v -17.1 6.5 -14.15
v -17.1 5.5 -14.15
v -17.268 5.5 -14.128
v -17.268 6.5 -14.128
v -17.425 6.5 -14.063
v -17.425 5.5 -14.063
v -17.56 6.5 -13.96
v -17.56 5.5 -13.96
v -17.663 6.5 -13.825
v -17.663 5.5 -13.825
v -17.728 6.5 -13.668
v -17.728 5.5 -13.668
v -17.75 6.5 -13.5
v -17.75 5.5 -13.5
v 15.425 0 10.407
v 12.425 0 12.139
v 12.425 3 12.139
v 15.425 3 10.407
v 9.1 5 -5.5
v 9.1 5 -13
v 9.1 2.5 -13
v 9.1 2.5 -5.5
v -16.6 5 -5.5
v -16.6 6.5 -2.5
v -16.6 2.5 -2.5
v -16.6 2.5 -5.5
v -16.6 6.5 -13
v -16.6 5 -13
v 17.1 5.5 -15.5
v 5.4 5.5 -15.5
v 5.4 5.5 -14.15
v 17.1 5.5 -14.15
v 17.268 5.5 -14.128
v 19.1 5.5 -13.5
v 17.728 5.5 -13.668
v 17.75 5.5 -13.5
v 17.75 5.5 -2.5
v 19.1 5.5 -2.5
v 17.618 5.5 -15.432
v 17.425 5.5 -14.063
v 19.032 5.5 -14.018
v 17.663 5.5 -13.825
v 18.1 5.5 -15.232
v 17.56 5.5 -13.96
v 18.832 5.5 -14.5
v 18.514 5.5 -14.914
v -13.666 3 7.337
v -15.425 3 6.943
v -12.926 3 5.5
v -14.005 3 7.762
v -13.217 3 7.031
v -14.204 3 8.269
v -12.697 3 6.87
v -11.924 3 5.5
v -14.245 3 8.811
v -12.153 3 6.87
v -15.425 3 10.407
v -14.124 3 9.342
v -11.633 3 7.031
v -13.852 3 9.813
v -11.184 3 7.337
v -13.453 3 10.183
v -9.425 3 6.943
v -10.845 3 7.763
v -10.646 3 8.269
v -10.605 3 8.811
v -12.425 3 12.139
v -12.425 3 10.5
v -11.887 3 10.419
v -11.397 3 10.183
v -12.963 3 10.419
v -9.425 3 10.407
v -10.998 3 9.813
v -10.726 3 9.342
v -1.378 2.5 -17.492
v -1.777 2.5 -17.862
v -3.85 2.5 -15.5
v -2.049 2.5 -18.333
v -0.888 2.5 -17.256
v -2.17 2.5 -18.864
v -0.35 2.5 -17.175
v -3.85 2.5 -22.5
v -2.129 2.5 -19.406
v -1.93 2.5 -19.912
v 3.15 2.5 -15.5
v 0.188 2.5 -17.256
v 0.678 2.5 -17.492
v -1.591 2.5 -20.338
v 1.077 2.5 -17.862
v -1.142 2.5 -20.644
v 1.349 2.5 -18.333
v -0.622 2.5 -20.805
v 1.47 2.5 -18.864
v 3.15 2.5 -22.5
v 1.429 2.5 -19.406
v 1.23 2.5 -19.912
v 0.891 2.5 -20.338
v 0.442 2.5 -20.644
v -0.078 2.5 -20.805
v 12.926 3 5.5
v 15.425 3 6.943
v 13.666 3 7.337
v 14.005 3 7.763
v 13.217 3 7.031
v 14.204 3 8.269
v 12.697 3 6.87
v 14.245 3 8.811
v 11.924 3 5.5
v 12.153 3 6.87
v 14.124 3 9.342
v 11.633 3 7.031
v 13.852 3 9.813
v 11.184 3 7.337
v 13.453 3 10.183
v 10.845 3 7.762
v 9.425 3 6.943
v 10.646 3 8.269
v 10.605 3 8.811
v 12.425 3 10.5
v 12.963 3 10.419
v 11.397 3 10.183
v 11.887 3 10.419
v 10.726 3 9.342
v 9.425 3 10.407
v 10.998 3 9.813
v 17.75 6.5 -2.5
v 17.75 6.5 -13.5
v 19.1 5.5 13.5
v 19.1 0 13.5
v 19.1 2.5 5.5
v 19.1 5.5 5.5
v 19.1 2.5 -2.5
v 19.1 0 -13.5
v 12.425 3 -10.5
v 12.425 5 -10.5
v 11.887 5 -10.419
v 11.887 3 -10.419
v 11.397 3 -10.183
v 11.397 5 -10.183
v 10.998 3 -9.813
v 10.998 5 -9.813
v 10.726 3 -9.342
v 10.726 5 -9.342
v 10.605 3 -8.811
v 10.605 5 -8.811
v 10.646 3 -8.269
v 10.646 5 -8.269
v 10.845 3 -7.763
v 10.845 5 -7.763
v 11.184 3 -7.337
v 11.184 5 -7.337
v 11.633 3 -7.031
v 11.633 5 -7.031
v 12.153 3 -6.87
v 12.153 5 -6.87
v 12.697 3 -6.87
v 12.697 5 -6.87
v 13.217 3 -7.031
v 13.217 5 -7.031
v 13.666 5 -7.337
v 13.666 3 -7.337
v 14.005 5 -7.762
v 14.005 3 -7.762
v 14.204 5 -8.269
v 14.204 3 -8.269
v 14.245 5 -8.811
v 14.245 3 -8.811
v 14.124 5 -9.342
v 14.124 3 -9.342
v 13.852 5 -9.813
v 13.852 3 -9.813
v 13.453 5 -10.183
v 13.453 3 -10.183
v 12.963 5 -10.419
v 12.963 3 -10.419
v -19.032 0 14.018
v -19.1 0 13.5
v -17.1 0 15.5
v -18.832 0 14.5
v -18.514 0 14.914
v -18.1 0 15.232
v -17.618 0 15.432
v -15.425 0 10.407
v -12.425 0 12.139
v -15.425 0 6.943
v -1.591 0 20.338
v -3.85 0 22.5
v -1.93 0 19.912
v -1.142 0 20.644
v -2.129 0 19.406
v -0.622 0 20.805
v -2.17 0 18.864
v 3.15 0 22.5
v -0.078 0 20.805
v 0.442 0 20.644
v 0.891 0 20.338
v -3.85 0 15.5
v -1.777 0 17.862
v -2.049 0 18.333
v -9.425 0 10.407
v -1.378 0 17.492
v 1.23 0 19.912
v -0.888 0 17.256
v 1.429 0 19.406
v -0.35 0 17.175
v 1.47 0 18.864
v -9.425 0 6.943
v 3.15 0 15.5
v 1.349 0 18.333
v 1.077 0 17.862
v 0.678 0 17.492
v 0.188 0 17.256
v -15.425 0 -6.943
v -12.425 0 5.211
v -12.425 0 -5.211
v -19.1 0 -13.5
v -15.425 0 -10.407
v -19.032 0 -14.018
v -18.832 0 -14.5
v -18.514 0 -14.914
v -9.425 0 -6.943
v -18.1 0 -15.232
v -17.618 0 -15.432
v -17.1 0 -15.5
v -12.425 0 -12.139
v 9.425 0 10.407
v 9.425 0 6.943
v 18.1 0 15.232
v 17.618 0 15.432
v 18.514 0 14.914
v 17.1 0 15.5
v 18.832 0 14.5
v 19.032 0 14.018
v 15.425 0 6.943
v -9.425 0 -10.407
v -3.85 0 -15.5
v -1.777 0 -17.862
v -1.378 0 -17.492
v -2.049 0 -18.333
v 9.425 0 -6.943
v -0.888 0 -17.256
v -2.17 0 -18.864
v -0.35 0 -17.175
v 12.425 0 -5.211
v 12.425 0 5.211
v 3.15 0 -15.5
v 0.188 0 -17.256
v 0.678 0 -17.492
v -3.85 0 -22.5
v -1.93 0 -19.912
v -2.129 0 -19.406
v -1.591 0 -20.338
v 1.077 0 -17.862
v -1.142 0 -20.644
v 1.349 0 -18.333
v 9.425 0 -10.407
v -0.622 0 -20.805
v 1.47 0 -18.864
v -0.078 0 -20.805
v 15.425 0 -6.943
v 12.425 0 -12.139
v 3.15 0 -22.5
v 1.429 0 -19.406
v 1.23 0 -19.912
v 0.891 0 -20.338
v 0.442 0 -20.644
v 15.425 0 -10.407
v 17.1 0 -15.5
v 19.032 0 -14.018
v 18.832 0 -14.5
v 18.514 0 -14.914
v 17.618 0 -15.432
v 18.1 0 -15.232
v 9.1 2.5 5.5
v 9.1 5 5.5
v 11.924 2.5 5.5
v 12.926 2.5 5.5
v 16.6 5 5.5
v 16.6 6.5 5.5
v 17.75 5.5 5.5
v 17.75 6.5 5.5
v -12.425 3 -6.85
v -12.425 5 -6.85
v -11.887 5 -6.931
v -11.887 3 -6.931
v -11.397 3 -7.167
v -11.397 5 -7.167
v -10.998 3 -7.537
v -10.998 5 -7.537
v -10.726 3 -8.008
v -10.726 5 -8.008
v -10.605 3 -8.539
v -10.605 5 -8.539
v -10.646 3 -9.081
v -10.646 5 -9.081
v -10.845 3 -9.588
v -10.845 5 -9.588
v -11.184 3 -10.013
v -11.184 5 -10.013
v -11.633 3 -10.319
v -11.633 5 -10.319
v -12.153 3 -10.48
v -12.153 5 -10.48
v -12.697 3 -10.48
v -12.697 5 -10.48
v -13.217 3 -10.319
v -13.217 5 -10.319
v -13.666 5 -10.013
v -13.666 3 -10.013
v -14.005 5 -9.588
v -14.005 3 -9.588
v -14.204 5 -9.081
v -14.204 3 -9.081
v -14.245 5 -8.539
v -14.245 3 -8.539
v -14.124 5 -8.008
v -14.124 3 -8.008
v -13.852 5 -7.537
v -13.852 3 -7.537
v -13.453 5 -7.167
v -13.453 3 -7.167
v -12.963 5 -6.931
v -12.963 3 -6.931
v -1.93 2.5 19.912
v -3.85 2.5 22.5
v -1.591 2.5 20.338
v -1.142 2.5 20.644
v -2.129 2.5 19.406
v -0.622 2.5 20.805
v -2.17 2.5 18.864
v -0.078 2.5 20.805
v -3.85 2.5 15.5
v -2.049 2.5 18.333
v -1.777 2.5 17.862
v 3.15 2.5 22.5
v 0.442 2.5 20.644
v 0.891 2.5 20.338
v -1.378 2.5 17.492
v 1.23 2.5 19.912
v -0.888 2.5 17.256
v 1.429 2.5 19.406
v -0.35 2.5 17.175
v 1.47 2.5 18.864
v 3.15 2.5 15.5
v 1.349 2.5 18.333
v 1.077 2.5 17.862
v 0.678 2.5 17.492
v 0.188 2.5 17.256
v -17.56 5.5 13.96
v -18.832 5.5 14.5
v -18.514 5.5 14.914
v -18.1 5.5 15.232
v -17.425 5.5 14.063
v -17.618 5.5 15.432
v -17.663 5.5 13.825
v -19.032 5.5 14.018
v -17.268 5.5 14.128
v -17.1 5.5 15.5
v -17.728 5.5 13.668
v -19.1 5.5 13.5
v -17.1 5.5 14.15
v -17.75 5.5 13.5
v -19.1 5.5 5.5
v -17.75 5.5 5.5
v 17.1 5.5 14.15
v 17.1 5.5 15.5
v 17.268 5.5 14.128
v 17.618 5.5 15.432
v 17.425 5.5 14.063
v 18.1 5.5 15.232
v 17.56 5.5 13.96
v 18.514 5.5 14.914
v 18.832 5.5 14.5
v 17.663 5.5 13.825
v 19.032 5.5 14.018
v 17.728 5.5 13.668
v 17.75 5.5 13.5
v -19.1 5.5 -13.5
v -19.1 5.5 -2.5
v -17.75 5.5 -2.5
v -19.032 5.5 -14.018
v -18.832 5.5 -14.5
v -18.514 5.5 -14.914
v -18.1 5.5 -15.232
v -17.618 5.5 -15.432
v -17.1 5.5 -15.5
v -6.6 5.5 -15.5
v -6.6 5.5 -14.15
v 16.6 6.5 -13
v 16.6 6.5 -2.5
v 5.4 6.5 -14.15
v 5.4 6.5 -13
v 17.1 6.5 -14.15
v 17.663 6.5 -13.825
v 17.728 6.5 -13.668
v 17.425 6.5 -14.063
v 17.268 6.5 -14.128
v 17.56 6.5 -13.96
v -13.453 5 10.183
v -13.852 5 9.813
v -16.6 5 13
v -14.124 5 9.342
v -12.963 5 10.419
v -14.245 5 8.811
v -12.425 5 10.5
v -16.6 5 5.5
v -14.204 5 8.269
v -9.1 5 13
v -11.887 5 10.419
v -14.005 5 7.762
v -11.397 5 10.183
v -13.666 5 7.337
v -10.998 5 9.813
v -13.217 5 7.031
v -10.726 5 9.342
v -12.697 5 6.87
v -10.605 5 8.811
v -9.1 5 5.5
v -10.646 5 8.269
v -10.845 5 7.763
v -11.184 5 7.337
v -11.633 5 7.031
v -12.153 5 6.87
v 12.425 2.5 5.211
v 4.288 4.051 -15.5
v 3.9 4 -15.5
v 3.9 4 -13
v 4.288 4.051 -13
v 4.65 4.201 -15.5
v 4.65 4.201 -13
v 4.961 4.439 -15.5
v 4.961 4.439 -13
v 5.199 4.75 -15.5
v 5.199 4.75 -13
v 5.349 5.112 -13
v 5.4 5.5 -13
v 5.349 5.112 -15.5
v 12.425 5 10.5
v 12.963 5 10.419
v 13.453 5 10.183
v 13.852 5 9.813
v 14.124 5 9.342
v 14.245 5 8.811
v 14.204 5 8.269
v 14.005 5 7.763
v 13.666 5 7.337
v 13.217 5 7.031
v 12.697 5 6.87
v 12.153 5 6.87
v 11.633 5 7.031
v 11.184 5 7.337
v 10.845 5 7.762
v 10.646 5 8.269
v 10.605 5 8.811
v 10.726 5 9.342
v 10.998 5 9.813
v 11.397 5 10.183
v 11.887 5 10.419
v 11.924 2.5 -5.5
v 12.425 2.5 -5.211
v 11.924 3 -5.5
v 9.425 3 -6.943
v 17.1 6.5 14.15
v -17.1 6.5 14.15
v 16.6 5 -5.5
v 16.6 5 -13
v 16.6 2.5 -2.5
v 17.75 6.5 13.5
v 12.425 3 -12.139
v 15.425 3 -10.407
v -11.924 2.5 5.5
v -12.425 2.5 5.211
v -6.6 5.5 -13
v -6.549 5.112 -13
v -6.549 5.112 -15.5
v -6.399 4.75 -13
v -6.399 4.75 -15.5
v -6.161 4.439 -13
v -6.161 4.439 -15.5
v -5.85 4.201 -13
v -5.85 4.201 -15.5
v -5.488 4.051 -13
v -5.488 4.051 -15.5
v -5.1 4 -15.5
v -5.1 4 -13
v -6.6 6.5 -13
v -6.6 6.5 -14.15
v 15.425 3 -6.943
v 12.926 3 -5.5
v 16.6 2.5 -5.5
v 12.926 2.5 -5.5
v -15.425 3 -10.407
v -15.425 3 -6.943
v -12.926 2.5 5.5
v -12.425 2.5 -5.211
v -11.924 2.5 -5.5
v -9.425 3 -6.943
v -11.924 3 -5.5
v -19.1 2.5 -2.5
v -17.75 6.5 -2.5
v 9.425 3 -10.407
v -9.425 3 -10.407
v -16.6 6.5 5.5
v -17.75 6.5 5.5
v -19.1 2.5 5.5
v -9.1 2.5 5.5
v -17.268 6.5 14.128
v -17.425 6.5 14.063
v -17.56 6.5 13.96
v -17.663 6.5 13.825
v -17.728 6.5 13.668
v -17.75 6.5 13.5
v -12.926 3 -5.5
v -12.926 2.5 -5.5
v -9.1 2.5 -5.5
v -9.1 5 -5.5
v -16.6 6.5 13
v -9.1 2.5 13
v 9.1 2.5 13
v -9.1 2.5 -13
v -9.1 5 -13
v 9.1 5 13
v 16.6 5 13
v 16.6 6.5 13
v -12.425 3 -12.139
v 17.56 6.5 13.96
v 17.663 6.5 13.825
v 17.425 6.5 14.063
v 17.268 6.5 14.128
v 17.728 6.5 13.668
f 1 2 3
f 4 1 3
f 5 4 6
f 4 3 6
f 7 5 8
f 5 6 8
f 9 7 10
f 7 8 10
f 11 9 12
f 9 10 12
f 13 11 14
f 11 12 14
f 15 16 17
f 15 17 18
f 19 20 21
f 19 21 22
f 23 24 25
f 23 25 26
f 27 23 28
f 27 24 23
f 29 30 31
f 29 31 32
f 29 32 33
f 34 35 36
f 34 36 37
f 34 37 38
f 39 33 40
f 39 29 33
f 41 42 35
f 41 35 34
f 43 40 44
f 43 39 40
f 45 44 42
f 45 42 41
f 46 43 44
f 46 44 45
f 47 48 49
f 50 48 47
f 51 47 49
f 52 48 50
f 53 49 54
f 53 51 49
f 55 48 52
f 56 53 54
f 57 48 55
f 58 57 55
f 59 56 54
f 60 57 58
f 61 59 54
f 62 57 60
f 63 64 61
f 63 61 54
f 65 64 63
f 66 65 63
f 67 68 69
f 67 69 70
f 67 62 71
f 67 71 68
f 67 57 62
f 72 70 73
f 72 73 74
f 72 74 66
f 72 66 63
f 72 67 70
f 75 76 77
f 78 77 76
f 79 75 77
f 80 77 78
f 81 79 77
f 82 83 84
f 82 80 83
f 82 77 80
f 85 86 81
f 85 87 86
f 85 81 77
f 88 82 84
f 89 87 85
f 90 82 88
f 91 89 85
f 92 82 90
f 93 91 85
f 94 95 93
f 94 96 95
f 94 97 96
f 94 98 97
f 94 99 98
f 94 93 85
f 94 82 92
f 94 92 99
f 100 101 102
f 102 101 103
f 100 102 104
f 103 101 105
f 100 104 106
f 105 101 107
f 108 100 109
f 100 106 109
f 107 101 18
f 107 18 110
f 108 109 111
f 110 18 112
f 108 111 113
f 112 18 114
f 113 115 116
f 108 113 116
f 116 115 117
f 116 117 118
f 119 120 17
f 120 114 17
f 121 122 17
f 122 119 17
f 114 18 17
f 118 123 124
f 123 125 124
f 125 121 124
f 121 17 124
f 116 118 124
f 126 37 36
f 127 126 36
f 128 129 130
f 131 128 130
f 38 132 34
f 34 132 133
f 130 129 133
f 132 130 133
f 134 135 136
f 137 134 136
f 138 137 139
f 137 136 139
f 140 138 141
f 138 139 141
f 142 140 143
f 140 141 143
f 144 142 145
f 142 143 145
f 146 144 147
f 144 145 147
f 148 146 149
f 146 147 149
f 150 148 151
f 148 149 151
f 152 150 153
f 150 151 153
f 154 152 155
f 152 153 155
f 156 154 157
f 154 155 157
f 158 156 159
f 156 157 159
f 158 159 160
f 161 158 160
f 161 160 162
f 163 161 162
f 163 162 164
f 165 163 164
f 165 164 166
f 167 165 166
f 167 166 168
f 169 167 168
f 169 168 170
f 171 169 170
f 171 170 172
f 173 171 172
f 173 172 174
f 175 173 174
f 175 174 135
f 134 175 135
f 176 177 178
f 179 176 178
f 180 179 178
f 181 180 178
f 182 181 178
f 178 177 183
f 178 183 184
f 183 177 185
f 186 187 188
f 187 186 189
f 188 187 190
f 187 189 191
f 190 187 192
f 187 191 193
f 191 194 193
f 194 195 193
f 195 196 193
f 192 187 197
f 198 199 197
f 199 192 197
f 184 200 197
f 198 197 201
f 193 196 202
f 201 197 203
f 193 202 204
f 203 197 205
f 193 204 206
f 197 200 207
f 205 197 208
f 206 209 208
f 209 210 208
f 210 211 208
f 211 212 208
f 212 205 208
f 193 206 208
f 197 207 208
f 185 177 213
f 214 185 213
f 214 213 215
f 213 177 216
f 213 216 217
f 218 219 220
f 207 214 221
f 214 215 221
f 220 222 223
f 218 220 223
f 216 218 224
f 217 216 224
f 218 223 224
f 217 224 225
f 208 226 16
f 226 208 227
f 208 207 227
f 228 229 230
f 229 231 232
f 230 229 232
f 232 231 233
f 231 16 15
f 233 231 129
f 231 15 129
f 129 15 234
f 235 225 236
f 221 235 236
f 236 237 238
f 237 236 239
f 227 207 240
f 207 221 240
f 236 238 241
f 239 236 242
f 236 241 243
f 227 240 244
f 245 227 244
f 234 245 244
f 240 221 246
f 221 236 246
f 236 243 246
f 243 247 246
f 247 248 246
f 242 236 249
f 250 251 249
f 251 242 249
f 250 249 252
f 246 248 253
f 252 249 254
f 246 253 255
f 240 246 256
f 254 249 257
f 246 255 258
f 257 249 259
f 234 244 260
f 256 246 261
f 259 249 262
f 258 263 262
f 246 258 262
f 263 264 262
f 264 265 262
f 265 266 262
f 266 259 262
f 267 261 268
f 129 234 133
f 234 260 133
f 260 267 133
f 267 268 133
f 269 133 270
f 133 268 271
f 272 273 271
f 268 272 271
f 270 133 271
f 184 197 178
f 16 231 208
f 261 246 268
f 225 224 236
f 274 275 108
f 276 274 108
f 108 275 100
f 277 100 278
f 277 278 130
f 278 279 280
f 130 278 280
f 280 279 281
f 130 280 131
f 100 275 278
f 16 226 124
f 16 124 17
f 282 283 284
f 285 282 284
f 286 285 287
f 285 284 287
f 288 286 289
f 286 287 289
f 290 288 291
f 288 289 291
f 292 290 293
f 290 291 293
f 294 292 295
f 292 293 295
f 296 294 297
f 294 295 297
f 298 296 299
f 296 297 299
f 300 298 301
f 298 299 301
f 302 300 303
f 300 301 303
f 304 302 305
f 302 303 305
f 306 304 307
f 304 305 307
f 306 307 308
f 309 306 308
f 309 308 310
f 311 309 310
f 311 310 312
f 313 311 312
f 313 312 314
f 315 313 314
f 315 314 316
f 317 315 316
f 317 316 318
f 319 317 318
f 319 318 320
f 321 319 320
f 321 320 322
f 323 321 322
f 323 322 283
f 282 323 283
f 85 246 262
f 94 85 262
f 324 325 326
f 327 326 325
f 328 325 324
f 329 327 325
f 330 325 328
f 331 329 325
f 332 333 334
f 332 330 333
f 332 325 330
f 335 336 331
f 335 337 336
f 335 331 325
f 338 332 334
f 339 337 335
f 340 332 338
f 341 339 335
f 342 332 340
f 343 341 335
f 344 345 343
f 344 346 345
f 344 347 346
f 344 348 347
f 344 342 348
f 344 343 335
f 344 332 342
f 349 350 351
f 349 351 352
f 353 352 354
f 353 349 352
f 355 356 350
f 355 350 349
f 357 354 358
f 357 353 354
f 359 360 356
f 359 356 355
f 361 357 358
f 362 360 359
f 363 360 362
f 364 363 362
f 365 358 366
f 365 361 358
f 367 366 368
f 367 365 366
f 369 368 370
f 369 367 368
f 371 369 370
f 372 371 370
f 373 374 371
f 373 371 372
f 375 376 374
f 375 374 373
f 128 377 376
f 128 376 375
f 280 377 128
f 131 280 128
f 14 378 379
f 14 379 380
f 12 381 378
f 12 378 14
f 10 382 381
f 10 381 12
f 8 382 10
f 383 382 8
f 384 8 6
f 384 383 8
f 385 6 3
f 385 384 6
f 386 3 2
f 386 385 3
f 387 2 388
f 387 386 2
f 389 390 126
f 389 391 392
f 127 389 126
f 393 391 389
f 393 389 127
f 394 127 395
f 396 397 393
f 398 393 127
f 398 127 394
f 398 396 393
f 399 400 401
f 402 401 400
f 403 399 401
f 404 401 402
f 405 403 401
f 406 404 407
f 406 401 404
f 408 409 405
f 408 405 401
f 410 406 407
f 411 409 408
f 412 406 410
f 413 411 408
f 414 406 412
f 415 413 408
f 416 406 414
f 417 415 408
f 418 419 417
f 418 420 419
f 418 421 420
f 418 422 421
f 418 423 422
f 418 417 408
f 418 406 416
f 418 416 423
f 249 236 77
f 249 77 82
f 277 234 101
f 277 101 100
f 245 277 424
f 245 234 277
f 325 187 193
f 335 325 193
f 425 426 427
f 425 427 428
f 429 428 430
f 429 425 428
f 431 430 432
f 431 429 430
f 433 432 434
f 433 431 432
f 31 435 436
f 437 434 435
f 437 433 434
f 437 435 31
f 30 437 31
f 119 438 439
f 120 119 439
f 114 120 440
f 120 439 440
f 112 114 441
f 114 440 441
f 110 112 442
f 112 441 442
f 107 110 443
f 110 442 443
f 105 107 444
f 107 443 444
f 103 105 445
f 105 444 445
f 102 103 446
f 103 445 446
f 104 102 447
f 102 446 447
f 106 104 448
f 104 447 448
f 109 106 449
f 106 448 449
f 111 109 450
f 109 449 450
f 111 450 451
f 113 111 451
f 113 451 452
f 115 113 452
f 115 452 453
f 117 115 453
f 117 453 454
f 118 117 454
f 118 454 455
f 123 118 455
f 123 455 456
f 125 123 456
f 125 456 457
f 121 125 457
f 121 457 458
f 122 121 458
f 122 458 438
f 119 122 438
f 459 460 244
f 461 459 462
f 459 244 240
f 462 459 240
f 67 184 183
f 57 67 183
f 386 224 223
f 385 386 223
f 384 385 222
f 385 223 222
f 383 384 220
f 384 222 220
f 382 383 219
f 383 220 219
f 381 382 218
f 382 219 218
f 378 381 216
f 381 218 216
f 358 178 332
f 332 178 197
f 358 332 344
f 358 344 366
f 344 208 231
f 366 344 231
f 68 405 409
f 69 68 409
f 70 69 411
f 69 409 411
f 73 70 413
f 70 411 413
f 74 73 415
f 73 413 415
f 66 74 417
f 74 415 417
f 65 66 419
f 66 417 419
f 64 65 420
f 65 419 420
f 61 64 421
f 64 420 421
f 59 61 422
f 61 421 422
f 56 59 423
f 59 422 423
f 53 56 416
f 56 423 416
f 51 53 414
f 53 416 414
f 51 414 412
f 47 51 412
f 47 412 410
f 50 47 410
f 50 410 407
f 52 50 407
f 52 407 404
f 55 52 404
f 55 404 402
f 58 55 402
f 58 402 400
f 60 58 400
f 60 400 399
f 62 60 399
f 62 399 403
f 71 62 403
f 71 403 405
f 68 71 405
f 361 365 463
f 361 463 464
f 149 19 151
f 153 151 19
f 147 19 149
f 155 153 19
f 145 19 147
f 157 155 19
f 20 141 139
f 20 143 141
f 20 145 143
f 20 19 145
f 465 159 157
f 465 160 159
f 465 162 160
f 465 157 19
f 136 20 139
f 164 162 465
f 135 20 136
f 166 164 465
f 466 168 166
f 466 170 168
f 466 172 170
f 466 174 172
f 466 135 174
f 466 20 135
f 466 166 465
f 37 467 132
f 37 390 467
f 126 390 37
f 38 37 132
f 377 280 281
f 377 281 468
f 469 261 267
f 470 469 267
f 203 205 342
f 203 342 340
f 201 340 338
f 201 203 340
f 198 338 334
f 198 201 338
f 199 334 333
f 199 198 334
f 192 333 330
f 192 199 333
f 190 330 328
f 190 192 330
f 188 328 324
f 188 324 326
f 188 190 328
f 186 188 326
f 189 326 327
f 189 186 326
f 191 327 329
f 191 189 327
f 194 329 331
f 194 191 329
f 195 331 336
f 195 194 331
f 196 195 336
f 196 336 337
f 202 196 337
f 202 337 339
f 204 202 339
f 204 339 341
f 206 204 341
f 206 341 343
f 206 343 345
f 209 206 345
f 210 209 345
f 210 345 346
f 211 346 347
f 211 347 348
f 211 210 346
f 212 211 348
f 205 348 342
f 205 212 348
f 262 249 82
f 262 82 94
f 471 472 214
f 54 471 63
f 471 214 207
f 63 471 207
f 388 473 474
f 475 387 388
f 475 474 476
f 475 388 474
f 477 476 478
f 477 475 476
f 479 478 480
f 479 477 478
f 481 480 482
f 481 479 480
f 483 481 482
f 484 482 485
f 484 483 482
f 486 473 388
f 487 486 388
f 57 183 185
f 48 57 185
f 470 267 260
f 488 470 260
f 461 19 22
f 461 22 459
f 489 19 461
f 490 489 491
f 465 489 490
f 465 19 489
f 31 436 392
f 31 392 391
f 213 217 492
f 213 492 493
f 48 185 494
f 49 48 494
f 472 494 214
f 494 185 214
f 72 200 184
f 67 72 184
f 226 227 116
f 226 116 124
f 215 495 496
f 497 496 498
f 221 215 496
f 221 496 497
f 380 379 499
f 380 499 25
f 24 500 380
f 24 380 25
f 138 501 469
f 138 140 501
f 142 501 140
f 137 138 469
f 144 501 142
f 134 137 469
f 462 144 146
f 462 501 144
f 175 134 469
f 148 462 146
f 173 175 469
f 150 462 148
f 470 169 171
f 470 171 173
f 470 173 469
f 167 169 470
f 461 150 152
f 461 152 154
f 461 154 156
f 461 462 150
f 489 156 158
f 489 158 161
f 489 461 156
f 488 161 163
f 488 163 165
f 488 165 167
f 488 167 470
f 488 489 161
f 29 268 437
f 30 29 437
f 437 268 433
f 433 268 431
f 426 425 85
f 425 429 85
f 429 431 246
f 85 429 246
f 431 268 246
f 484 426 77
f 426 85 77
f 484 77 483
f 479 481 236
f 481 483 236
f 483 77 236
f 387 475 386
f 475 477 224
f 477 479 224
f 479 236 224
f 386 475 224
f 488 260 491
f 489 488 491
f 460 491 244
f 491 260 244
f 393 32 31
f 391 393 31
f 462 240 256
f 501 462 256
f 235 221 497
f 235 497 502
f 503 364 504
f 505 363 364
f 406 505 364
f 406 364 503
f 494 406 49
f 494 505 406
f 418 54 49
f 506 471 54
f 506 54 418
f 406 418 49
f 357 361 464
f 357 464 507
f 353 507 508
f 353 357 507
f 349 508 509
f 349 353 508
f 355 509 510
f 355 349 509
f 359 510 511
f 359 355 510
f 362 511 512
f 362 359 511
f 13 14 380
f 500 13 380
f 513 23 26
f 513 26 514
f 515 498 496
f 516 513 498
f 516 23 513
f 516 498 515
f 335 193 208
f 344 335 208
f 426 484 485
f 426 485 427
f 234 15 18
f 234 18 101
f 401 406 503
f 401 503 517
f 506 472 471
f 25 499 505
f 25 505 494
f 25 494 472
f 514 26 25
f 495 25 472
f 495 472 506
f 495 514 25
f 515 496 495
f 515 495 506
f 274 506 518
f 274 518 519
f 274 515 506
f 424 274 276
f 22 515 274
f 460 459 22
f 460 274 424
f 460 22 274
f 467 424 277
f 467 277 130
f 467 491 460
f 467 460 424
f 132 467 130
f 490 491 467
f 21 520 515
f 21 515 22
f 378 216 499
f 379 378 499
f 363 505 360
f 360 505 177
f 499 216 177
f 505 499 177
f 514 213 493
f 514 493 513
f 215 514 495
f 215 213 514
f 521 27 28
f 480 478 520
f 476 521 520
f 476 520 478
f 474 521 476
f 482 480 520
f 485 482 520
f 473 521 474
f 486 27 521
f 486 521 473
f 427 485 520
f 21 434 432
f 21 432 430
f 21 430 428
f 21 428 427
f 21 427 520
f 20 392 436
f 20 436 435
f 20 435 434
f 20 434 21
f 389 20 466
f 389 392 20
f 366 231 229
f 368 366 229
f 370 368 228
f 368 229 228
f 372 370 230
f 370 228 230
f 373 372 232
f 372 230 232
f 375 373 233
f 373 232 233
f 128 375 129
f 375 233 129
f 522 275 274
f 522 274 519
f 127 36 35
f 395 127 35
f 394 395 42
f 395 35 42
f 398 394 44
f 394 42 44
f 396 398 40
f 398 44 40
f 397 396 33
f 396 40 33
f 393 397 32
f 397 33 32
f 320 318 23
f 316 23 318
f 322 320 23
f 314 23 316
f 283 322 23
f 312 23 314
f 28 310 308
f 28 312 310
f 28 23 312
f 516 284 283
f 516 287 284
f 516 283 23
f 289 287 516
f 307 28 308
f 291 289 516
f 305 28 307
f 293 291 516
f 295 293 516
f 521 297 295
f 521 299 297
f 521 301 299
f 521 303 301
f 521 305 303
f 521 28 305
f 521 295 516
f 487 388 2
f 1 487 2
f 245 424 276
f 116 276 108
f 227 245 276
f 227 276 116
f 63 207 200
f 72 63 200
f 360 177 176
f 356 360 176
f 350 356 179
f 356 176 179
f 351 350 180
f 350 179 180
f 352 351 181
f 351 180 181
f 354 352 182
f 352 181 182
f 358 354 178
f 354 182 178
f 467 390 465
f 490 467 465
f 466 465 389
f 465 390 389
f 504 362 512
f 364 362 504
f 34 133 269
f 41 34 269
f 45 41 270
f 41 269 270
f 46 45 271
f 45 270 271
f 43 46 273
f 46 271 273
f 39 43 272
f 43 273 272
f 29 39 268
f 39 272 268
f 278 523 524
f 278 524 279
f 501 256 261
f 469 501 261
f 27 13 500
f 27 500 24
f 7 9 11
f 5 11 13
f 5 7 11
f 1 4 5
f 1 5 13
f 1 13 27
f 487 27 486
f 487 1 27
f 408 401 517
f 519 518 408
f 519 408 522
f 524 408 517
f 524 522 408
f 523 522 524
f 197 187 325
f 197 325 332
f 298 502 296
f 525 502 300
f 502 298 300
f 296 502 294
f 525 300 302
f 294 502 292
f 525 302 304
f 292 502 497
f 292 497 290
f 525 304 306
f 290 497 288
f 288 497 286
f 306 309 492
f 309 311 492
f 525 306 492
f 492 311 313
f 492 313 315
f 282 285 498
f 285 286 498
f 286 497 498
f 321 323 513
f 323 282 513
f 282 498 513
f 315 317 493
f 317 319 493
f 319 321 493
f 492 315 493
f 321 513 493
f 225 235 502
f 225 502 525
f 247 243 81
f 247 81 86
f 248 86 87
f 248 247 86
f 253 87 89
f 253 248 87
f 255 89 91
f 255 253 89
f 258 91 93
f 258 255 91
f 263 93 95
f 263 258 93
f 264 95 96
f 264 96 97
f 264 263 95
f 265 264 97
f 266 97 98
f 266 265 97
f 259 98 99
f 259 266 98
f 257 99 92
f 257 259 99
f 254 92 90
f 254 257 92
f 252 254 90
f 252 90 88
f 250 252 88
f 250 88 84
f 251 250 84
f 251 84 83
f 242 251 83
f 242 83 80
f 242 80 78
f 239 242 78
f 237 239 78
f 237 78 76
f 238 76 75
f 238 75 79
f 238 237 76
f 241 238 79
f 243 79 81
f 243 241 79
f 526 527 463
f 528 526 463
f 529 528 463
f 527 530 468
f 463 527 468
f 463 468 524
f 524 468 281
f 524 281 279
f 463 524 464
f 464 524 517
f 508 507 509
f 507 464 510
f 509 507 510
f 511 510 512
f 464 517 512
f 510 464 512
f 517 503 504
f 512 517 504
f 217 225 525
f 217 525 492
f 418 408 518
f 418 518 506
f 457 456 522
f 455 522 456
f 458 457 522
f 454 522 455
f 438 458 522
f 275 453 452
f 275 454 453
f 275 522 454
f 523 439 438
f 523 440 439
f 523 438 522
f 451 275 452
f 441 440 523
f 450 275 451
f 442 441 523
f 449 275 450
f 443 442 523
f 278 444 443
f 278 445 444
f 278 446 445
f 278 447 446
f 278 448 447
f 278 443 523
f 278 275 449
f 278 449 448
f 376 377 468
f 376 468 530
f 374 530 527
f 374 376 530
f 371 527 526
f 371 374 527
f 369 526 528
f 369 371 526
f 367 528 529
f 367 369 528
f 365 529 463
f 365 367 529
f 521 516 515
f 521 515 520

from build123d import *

# Parameters (mm, degrees)
BOSS_EXTRUDE1_DEPTH = 5.5
CUT_EXTRUDE1_DEPTH  = 3
SKETCH3_W           = 7.5
SKETCH3_H           = 7.5
CUT_EXTRUDE2_DEPTH  = 0.5
SKETCH4_R           = 1.825
CUT_EXTRUDE3_DEPTH  = 10
SKETCH5_W           = 2.5
SKETCH5_H           = 8
CUT_EXTRUDE4_DEPTH  = 3
SKETCH6_W           = 7
SKETCH6_H           = 7
SKETCH6_R           = 1.825
BOSS_EXTRUDE2_DEPTH = 2.5
BOSS_EXTRUDE3_DEPTH = 1
CUT_EXTRUDE6_DEPTH  = 4
SKETCH10_W          = 12
SKETCH10_H          = 2.5
CUT_EXTRUDE7_DEPTH  = 4
CUT_EXTRUDE8_DEPTH  = 3


with BuildPart() as part:
    # Sketch1 → Boss-Extrude1 (new body)
    with BuildSketch(Plane(origin=(0, 0, 0), x_dir=(1, 0, 0), z_dir=(0, 1, 0))):
        with BuildLine():
            Line((-17.1, -15.5), (17.1, -15.5))
            ThreePointArc((17.1, -15.5), (18.514213562, -14.914213562), (19.1, -13.5))
            Line((19.1, -13.5), (19.1, 13.5))
            ThreePointArc((19.1, 13.5), (18.514213562, 14.914213562), (17.1, 15.5))
            Line((17.1, 15.5), (-17.1, 15.5))
            ThreePointArc((-17.1, 15.5), (-18.514213562, 14.914213562), (-19.1, 13.5))
            Line((-19.1, 13.5), (-19.1, -13.5))
            ThreePointArc((-19.1, -13.5), (-18.514213562, -14.914213562), (-17.1, -15.5))
        make_face()
    extrude(amount=BOSS_EXTRUDE1_DEPTH)

    # Sketch2 → Cut-Extrude1 (cut)
    with BuildSketch(Plane(origin=(0, 5.5, 0), x_dir=(1, 0, 0), z_dir=(0, 1, 0))):
        Polygon((-16.6, 5.5), (-9.1, 5.5), (-9.1, 13), (9.1, 13), (9.1, 5.5), (16.6, 5.5), (16.6, -5.5), (9.1, -5.5), (9.1, -13), (-9.1, -13), (-9.1, -5.5), (-16.6, -5.5), align=None)
    extrude(amount=-CUT_EXTRUDE1_DEPTH, mode=Mode.SUBTRACT)

    # Sketch3 → Cut-Extrude2 (cut)
    with BuildSketch(Plane(origin=(0, 5.5, 0), x_dir=(1, 0, 0), z_dir=(0, 1, 0))):
        with Locations((-12.85, 9.25)):
            Rectangle(SKETCH3_W, SKETCH3_H)
        with Locations((12.85, 9.25)):
            Rectangle(SKETCH3_W, SKETCH3_H)
        with Locations((12.85, -9.25)):
            Rectangle(SKETCH3_W, SKETCH3_H)
        with Locations((-12.85, -9.25)):
            Rectangle(SKETCH3_W, SKETCH3_H)
    extrude(amount=-CUT_EXTRUDE2_DEPTH, mode=Mode.SUBTRACT)

    # Sketch4 → Cut-Extrude3 (cut)
    with BuildSketch(Plane(origin=(0, 5.5, 0), x_dir=(1, 0, 0), z_dir=(0, 1, 0))):
        with Locations(Location((-12.425, 8.675, 0), (0, 0, 270))):
            Circle(SKETCH4_R)
        with Locations(Location((12.425, 8.675, 0), (0, 0, 90))):
            Circle(SKETCH4_R)
        with Locations(Location((12.425, -8.675, 0), (0, 0, 270))):
            Circle(SKETCH4_R)
        with Locations(Location((-12.425, -8.675, 0), (0, 0, 270))):
            Circle(SKETCH4_R)
    extrude(amount=-CUT_EXTRUDE3_DEPTH, mode=Mode.SUBTRACT)

    # Sketch5 → Cut-Extrude4 (cut)
    with BuildSketch(Plane(origin=(0, 5.5, 0), x_dir=(1, 0, 0), z_dir=(0, 1, 0))):
        with Locations((-17.85, -1.5)):
            Rectangle(SKETCH5_W, SKETCH5_H)
        with Locations((17.85, -1.5)):
            Rectangle(SKETCH5_W, SKETCH5_H)
    extrude(amount=-CUT_EXTRUDE4_DEPTH, mode=Mode.SUBTRACT)

    # Sketch6 → Boss-Extrude2 (add)
    # profile 1 of 2: a face of its own
    with BuildSketch(Plane(origin=(0, 0, 0), x_dir=(1, 0, 0), z_dir=(0, 1, 0))):
        with Locations((-0.35, 19)):
            Rectangle(SKETCH6_W, SKETCH6_H)
        with Locations(Location((-0.35, 19, 0), (0, 0, 270))):
            Circle(SKETCH6_R, mode=Mode.SUBTRACT)
    # profile 2 of 2: a face of its own
    with BuildSketch(Plane(origin=(0, 0, 0), x_dir=(1, 0, 0), z_dir=(0, 1, 0))):
        with Locations((-0.35, -19)):
            Rectangle(SKETCH6_W, SKETCH6_H)
        with Locations(Location((-0.35, -19, 0), (0, 0, 90))):
            Circle(SKETCH6_R, mode=Mode.SUBTRACT)
    extrude(amount=BOSS_EXTRUDE2_DEPTH)

    # Sketch7 → Boss-Extrude3 (add)
    with BuildSketch(Plane(origin=(0, 5.5, 0), x_dir=(1, 0, 0), z_dir=(0, 1, 0))):
        with BuildLine():
            ThreePointArc((-17.1, -14.15), (-17.559619408, -13.959619408), (-17.75, -13.5))
            Line((-17.75, -13.5), (-17.75, -5.5))
            Line((-17.75, -5.5), (-16.6, -5.5))
            Line((-16.6, -5.5), (-16.6, -13))
            Line((-16.6, -13), (16.6, -13))
            Line((16.6, -13), (16.6, -5.5))
            Line((16.6, -5.5), (17.75, -5.5))
            Line((17.75, -5.5), (17.75, -13.5))
            ThreePointArc((17.75, -13.5), (17.559619408, -13.959619408), (17.1, -14.15))
            Line((17.1, -14.15), (-17.1, -14.15))
        make_face()
        with BuildLine():
            Line((16.6, 2.5), (17.75, 2.5))
            Line((17.75, 2.5), (17.75, 13.5))
            ThreePointArc((17.75, 13.5), (17.559619408, 13.959619408), (17.1, 14.15))
            Line((17.1, 14.15), (-17.1, 14.15))
            ThreePointArc((-17.1, 14.15), (-17.559619408, 13.959619408), (-17.75, 13.5))
            Line((-17.75, 13.5), (-17.75, 2.5))
            Line((-17.75, 2.5), (-16.6, 2.5))
            Line((-16.6, 2.5), (-16.6, 13))
            Line((-16.6, 13), (16.6, 13))
            Line((16.6, 13), (16.6, 2.5))
        make_face()
    extrude(amount=BOSS_EXTRUDE3_DEPTH)

    # Sketch9 → Cut-Extrude6 (cut)
    with BuildSketch(Plane(origin=(0, 0, -15.5), x_dir=(-1, 0, 0), z_dir=(0, 0, -1))):
        with BuildLine():
            Line((5.1, 4), (-3.9, 4))
            ThreePointArc((-3.9, 4), (-5.4, 5.5), (-3.9, 7))
            Line((-3.9, 7), (5.1, 7))
            ThreePointArc((5.1, 7), (6.6, 5.5), (5.1, 4))
        make_face()
    extrude(amount=-CUT_EXTRUDE6_DEPTH, mode=Mode.SUBTRACT)

    # Sketch10 → Cut-Extrude7 (cut)
    with BuildSketch(Plane(origin=(0, 5.5, 0), x_dir=(1, 0, 0), z_dir=(0, 1, 0))):
        with Locations((-0.6, 14.25)):
            Rectangle(SKETCH10_W, SKETCH10_H)
    extrude(amount=CUT_EXTRUDE7_DEPTH, mode=Mode.SUBTRACT)

    # Sketch12 → Cut-Extrude8 (cut)
    with BuildSketch(Plane.XZ):
        Polygon((-12.425, 12.139101615), (-15.425, 10.407050808), (-15.425, 6.942949192), (-12.425, 5.210898385), (-9.425, 6.942949192), (-9.425, 10.407050808), align=None)
        Polygon((9.425, 10.407050808), (12.425, 12.139101615), (15.425, 10.407050808), (15.425, 6.942949192), (12.425, 5.210898385), (9.425, 6.942949192), align=None)
        Polygon((12.425, -12.139101615), (15.425, -10.407050808), (15.425, -6.942949192), (12.425, -5.210898385), (9.425, -6.942949192), (9.425, -10.407050808), align=None)
        Polygon((-9.425, -10.407050808), (-12.425, -12.139101615), (-15.425, -10.407050808), (-15.425, -6.942949192), (-12.425, -5.210898385), (-9.425, -6.942949192), align=None)
    extrude(amount=-CUT_EXTRUDE8_DEPTH, mode=Mode.SUBTRACT)


solid = part.part
